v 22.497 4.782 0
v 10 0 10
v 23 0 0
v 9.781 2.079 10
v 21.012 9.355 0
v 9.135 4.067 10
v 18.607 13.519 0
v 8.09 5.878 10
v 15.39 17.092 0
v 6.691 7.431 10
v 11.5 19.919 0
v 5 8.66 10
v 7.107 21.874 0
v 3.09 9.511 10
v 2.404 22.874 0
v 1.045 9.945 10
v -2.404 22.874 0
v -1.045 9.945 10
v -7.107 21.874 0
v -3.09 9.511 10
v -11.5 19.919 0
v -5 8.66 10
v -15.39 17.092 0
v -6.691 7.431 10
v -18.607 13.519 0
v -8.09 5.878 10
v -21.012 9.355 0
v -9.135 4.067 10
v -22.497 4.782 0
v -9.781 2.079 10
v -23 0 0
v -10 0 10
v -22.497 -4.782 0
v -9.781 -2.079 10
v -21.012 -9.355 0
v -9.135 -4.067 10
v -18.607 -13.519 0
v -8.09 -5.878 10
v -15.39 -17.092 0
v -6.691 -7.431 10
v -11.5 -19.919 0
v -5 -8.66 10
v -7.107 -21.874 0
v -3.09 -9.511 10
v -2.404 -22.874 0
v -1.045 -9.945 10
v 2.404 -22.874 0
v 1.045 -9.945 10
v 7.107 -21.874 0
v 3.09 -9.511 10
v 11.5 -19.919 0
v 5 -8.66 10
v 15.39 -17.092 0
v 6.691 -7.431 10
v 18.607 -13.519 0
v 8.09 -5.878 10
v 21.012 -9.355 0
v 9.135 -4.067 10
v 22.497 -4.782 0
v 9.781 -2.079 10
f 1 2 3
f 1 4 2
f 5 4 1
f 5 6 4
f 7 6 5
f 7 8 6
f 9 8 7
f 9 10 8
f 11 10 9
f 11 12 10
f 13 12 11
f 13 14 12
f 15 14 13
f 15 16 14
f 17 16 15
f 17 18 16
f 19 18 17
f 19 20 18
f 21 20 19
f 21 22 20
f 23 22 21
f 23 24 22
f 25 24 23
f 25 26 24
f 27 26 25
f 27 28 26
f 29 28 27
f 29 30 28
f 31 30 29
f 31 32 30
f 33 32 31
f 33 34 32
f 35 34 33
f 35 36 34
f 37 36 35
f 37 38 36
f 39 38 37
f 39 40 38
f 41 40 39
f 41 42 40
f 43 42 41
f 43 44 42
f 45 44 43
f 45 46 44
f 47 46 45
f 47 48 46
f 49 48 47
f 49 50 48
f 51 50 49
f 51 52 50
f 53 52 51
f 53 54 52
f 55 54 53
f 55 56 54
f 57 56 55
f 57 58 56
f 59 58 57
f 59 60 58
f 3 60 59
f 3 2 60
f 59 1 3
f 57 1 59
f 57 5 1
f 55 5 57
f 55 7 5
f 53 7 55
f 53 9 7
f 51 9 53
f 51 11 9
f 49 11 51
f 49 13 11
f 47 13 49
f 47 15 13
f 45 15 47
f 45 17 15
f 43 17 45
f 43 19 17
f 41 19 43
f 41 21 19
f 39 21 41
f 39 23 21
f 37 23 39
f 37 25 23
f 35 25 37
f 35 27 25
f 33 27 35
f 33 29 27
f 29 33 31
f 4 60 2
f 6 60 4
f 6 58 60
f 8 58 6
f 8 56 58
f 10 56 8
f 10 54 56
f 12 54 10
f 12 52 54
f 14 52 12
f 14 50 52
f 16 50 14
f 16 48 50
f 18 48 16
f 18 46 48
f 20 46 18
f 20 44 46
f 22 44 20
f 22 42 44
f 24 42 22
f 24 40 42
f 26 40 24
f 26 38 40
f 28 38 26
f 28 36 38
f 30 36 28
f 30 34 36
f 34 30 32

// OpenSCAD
// Volume: 8929.807099769992, SurfaceArea: 3653.061817190116
module mymodule(modparam) {
  inner_variable = 23;
  inner_variable2 = modparam * 2;
  cylinder(r1=inner_variable, r2=inner_variable2, h=10);
}

mymodule(5);
